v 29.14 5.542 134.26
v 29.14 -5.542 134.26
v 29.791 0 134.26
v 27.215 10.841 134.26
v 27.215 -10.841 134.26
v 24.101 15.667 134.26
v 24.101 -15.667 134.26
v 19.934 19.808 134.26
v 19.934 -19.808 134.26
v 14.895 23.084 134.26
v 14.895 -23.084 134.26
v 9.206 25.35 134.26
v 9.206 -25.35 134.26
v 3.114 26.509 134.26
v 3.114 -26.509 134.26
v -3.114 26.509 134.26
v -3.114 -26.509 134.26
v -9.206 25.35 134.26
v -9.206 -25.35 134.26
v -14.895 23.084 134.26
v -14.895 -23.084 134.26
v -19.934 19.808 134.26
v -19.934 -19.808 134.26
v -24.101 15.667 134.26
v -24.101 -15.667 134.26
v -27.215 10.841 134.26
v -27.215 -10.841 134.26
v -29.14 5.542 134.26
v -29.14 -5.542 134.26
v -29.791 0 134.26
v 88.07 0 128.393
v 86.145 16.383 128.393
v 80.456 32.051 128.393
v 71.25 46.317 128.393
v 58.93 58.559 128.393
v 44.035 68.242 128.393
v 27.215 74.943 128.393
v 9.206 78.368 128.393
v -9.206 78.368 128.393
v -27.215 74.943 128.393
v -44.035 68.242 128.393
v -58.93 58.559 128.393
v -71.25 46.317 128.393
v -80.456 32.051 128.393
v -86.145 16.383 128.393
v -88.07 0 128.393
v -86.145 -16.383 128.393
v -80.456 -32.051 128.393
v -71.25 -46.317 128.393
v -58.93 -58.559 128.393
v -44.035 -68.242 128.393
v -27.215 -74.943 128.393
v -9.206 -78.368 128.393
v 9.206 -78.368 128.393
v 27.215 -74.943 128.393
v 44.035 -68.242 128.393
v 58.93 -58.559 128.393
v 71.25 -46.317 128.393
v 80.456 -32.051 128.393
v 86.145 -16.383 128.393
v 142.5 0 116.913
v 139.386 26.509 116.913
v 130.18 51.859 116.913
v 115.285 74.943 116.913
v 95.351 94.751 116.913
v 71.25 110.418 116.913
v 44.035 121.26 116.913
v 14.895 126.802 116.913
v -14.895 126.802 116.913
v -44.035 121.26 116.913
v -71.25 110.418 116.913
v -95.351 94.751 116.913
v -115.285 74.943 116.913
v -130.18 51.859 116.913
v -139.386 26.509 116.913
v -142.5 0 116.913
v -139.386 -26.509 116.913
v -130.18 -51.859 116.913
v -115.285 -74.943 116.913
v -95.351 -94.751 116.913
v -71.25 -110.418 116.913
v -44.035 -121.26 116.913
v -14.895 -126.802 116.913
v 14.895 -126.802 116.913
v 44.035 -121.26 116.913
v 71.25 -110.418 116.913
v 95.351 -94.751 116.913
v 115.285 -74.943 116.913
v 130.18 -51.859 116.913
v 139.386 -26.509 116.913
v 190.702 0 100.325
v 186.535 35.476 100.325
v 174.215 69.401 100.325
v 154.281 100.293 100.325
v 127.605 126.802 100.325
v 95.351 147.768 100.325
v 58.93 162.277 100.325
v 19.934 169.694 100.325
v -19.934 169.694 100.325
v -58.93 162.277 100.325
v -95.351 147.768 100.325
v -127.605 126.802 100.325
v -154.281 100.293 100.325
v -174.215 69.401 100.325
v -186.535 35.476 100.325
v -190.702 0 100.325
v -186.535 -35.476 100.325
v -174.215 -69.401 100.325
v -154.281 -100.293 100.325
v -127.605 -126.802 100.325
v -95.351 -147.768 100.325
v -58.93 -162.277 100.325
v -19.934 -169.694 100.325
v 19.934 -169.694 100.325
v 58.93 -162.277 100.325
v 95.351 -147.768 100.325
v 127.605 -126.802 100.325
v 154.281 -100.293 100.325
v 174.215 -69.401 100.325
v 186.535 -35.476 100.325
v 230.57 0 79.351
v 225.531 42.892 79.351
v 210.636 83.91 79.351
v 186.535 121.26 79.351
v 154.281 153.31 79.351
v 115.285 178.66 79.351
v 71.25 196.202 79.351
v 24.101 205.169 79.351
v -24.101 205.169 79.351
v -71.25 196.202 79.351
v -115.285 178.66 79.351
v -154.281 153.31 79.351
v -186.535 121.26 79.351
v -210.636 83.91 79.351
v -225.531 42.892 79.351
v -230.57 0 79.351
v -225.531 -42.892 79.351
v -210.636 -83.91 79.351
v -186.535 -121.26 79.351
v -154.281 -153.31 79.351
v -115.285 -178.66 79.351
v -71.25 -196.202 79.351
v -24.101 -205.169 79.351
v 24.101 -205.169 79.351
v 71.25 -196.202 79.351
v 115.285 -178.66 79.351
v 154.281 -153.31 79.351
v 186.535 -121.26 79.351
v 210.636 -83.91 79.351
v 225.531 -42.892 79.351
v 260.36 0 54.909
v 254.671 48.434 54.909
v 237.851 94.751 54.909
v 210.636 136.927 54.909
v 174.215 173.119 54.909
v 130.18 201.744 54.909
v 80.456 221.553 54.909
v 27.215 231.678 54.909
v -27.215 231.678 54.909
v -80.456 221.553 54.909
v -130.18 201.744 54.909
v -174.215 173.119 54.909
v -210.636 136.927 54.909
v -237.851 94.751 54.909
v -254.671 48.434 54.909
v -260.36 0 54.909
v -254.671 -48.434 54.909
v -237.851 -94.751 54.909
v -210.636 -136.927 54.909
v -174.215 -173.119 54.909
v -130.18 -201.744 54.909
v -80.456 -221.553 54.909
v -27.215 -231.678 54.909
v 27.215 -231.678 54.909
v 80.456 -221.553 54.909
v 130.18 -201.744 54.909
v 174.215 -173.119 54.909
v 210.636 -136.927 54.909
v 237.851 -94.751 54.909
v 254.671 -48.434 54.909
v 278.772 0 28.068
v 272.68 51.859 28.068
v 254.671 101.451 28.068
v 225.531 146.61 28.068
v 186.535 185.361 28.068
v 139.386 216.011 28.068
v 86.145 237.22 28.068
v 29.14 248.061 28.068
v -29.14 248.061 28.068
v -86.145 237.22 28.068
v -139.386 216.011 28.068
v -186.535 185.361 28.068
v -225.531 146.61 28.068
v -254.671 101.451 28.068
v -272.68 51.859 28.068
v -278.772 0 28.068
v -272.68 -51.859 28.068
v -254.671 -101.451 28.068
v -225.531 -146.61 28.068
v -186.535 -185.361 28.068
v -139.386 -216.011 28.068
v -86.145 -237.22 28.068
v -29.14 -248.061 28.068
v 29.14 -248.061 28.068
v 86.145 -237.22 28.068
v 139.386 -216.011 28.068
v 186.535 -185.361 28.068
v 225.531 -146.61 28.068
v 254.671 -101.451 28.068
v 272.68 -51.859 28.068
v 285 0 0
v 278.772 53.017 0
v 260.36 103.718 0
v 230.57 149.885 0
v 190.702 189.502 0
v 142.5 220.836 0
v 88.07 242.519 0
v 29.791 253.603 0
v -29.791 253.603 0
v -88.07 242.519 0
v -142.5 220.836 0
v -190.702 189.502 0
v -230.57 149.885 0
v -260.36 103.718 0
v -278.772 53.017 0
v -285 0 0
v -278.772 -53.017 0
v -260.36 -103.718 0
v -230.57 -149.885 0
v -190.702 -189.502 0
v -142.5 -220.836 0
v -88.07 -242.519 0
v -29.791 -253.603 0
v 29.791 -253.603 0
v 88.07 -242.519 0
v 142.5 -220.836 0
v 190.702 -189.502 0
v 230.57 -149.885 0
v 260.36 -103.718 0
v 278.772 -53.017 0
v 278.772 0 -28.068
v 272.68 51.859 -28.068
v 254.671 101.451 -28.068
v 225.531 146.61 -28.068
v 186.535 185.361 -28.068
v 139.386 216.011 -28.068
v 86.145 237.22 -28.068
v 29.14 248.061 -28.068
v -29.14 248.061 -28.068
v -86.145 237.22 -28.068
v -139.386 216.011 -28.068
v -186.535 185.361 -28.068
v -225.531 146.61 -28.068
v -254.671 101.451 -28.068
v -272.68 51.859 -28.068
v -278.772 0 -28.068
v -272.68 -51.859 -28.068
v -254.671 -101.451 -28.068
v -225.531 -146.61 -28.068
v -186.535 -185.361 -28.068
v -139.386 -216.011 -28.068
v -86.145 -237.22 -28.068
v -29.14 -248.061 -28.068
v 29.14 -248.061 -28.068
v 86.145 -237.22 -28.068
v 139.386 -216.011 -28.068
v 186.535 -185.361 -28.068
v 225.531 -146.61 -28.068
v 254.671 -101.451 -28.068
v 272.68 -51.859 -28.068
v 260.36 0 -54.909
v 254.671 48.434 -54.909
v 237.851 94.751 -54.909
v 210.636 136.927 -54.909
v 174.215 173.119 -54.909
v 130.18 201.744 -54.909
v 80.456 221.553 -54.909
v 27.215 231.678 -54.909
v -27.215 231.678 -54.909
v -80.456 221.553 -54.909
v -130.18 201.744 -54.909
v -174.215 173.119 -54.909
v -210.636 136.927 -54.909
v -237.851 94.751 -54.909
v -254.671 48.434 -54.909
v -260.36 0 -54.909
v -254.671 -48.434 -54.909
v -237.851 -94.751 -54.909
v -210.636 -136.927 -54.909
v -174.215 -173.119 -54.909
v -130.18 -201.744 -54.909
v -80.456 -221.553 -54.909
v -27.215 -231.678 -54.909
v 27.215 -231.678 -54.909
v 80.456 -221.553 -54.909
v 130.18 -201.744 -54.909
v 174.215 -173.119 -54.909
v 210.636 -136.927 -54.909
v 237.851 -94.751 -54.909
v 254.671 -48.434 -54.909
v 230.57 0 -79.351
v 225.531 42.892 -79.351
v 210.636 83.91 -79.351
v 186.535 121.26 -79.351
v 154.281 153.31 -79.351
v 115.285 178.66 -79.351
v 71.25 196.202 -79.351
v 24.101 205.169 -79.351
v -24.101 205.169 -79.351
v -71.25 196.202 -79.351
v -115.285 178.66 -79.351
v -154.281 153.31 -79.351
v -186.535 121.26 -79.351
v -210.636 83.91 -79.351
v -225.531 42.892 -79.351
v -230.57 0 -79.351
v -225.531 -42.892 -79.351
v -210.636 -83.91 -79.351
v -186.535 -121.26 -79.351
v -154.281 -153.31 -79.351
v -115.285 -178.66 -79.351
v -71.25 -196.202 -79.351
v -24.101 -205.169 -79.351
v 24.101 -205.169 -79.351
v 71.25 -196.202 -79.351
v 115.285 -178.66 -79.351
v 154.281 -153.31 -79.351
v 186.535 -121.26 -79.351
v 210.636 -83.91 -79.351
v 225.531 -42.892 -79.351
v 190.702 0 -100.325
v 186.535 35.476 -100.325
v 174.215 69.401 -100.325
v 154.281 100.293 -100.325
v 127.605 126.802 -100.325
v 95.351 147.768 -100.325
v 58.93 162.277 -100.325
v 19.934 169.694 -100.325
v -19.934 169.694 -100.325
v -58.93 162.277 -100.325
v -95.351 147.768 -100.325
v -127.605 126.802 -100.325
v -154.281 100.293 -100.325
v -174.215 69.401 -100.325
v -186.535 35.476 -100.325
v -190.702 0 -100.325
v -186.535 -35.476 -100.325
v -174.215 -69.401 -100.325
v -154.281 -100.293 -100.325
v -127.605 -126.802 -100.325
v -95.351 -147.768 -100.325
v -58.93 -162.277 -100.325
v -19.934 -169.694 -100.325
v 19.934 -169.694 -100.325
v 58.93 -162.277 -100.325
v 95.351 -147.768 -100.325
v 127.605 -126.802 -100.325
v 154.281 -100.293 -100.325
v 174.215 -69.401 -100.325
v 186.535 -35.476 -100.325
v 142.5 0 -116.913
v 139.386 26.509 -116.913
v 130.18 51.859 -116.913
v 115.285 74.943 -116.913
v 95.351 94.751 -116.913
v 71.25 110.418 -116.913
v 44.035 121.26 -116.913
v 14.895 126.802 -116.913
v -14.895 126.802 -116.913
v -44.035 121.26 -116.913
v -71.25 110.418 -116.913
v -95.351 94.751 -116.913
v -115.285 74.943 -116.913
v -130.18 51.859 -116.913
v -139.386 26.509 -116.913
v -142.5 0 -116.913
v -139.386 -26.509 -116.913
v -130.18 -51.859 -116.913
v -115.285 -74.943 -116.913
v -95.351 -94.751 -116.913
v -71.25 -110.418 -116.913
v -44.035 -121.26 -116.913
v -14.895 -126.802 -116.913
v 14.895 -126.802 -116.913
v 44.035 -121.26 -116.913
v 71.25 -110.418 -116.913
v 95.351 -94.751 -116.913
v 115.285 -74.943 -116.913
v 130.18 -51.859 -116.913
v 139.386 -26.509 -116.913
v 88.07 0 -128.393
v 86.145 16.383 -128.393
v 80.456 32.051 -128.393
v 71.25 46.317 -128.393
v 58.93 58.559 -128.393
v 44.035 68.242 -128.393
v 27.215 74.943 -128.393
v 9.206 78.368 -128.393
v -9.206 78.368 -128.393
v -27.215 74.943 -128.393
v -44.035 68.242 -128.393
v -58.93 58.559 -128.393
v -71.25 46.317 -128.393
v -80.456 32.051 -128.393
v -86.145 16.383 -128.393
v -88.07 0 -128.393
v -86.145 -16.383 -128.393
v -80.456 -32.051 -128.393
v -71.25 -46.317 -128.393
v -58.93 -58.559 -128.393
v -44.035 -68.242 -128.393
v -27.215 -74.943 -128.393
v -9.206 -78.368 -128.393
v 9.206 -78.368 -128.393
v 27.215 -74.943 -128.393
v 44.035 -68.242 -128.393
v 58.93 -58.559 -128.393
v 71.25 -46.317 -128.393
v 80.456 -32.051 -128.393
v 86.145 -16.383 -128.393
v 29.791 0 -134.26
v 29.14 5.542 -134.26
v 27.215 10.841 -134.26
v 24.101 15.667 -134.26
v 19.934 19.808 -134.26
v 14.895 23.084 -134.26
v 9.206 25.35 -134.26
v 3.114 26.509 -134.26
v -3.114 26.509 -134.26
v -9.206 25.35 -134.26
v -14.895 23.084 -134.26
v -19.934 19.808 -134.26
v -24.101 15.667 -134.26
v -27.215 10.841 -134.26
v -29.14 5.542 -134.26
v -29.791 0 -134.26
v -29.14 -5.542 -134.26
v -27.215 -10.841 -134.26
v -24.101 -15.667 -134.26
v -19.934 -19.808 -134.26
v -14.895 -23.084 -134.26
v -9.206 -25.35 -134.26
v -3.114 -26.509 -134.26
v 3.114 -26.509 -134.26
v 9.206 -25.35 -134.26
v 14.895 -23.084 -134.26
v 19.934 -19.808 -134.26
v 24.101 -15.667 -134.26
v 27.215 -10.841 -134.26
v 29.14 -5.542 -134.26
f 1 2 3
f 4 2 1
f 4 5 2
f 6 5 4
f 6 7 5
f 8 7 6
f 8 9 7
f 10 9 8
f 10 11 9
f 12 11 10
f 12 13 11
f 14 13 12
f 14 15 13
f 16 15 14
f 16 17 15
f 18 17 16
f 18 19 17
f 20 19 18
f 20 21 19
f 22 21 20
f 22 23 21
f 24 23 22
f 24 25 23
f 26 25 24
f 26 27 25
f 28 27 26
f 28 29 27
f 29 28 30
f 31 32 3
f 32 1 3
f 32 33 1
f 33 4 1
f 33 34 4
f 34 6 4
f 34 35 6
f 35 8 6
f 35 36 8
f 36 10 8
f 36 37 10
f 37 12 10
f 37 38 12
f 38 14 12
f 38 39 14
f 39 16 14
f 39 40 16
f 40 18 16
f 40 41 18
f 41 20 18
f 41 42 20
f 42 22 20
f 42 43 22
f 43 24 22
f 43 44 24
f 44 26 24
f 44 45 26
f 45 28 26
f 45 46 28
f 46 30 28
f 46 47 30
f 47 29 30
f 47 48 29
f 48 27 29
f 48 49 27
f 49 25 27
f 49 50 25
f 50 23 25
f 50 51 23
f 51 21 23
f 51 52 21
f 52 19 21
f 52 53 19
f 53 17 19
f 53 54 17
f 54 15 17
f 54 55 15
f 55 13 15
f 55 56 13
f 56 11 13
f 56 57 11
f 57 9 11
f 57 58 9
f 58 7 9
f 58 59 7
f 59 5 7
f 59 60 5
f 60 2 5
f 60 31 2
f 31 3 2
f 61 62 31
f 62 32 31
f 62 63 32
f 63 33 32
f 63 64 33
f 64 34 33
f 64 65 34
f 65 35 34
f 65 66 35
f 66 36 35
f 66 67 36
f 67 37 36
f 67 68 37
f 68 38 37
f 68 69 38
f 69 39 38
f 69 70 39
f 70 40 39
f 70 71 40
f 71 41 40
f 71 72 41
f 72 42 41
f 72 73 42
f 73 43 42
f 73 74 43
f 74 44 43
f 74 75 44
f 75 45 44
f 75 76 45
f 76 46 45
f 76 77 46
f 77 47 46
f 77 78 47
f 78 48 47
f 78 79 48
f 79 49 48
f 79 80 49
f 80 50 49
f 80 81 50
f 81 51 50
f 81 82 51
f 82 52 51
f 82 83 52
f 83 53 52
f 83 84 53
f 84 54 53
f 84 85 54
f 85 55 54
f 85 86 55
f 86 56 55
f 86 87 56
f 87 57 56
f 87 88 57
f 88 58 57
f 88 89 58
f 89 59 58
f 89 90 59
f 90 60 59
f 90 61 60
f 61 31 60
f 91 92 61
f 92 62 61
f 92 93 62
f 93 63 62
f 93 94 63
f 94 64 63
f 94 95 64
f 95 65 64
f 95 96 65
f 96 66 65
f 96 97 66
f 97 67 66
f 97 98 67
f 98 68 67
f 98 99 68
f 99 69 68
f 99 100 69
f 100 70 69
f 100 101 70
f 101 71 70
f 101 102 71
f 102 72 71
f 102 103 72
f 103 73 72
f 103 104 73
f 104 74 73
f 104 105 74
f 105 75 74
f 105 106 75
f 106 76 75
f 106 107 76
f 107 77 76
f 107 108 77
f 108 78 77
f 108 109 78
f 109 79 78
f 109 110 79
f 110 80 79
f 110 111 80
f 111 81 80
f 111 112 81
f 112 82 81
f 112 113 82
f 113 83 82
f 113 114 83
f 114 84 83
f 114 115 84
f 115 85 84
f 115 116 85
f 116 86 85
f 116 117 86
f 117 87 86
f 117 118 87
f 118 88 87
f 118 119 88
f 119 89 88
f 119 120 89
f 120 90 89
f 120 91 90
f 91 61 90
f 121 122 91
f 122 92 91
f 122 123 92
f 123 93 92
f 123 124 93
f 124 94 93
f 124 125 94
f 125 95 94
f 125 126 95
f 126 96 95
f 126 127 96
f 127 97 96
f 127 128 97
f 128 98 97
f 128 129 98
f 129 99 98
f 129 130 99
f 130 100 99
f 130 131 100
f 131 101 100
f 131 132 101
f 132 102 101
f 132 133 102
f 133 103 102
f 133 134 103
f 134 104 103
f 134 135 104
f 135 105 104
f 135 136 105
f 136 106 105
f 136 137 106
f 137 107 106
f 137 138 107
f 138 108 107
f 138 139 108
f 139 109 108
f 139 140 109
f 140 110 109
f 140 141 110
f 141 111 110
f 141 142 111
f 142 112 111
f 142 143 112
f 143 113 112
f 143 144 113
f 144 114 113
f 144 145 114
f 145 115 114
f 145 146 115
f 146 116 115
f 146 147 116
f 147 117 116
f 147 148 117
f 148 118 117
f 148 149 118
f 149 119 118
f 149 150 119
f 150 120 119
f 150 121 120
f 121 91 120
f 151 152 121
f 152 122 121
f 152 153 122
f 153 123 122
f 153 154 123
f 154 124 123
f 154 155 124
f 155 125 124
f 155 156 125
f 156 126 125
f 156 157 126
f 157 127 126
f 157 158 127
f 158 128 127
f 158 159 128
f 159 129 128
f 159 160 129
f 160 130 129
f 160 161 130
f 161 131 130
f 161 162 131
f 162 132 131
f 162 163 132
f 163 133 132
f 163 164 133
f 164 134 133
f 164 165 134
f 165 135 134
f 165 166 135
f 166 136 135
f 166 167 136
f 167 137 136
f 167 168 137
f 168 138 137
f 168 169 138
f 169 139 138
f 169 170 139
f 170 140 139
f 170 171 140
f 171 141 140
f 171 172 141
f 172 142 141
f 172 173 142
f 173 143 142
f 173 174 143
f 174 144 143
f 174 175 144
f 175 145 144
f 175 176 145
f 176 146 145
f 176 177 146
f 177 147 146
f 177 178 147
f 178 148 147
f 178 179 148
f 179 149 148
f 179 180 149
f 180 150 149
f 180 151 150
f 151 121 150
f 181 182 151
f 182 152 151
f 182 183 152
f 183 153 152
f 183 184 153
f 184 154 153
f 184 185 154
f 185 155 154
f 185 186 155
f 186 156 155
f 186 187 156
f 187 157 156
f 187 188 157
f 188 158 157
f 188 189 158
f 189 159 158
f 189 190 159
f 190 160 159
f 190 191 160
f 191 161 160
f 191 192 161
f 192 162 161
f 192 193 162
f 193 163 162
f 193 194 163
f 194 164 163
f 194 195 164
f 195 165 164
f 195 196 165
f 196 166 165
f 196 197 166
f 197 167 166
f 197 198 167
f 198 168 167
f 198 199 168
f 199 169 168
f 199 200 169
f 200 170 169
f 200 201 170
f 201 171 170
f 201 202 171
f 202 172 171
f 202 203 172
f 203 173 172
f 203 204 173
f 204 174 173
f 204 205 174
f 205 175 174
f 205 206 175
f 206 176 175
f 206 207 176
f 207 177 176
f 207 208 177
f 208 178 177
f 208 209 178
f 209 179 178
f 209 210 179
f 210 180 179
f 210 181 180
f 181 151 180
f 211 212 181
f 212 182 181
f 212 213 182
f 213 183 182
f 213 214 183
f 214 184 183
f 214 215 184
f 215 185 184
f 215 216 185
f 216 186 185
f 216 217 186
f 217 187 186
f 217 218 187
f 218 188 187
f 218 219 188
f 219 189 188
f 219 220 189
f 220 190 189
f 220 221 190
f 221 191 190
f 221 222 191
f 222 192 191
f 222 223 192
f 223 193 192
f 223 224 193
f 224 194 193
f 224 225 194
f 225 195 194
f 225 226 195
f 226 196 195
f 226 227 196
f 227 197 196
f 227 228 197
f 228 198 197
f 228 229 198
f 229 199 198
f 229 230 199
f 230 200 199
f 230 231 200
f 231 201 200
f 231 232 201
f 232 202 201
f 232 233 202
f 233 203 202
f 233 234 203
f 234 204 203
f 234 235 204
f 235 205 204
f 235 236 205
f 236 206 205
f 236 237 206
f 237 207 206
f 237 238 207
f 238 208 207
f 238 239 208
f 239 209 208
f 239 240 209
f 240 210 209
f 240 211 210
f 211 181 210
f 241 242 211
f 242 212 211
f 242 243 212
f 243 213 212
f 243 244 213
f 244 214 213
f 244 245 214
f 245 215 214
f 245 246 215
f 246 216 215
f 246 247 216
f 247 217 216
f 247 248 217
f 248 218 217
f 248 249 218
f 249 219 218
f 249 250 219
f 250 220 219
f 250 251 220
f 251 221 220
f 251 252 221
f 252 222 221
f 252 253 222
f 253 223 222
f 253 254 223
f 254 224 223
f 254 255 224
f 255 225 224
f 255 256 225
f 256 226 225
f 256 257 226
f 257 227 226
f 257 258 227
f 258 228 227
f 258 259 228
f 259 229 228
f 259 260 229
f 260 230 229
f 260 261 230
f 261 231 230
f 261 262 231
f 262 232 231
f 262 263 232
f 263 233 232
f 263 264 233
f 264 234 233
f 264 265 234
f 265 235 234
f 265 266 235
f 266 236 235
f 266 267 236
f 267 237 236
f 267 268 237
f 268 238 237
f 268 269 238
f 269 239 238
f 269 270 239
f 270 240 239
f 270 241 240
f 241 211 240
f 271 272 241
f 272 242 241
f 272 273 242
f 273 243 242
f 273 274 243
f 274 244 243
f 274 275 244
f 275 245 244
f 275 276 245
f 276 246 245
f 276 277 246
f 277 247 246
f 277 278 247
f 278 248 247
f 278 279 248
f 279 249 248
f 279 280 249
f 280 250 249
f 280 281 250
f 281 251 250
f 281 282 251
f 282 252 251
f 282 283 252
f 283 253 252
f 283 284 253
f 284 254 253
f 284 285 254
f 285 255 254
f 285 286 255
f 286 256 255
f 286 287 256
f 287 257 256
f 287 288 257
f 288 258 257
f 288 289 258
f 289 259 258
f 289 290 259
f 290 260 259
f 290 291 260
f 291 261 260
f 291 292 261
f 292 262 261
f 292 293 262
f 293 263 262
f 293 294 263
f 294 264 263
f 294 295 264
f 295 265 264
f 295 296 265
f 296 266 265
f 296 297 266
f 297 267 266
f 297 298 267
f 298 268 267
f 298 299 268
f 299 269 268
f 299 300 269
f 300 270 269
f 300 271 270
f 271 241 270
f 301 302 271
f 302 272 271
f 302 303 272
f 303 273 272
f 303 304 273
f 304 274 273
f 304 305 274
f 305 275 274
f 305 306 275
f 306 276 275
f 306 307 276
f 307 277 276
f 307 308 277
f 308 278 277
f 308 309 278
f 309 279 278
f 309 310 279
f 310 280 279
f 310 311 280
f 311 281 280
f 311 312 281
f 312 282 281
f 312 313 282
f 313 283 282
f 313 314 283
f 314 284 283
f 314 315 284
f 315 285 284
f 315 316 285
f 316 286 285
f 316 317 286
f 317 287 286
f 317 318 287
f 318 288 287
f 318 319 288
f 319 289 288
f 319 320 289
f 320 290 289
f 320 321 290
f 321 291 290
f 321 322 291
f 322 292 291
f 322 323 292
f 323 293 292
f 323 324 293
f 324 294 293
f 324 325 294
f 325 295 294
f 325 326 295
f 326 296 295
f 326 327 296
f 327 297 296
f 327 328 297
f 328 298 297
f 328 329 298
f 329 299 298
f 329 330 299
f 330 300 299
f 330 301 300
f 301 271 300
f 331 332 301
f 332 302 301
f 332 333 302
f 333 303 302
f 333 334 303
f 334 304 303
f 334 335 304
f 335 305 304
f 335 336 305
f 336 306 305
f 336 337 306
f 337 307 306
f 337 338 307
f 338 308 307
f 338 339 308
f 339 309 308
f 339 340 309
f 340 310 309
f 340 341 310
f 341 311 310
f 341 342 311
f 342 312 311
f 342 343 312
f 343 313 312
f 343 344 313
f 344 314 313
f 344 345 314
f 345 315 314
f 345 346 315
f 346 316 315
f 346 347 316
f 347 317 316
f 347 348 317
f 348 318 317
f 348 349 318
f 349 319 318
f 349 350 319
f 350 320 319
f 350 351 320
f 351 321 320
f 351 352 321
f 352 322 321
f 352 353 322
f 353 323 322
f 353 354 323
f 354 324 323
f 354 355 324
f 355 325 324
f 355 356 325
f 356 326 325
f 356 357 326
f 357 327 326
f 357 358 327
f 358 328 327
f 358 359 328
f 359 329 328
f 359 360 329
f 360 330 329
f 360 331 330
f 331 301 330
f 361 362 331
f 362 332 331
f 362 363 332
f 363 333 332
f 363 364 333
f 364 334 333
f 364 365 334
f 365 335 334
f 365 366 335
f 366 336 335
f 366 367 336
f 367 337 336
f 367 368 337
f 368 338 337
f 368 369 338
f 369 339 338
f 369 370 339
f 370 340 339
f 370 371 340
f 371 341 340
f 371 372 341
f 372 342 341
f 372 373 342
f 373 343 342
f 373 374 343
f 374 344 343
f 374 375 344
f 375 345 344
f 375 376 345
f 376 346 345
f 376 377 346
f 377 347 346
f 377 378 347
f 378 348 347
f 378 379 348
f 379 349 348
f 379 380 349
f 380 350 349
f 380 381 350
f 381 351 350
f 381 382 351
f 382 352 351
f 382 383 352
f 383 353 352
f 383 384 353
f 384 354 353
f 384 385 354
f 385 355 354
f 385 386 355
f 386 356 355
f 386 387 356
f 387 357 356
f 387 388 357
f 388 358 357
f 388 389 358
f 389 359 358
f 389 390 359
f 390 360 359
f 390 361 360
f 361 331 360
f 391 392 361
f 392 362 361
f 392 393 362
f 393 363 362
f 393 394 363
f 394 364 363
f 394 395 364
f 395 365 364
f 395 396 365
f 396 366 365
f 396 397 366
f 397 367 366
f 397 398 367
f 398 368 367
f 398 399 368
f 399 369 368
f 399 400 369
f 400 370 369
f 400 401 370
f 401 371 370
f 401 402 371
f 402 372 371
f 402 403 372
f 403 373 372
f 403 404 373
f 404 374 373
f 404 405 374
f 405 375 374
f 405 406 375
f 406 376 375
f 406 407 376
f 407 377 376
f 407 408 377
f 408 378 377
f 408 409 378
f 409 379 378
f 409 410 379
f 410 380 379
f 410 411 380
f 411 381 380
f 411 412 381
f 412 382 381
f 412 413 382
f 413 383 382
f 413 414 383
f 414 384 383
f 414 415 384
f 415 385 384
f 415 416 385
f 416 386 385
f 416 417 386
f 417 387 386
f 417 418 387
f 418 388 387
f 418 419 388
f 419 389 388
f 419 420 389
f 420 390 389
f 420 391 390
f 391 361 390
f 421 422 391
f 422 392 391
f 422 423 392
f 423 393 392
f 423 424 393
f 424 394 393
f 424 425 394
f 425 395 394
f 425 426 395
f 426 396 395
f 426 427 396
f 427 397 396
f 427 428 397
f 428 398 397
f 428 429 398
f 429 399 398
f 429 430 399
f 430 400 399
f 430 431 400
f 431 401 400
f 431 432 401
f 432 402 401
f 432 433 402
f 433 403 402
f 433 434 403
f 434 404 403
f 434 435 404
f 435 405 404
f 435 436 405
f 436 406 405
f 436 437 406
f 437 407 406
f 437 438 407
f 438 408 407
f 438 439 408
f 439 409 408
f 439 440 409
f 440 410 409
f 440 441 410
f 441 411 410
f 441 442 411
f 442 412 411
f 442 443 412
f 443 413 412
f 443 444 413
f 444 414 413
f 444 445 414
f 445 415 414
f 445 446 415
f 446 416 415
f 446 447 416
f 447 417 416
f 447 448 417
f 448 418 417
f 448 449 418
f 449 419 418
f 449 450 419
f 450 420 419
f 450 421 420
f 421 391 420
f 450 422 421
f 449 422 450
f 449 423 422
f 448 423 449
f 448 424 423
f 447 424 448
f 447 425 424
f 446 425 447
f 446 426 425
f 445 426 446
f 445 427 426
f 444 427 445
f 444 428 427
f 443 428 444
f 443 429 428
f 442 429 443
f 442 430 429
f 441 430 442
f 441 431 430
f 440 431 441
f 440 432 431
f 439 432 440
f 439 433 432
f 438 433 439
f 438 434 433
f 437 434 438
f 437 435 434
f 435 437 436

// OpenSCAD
// Generated by SolidPython 1.0.1 on 2020-07-29 00:46:54


scale(v = [19, 17, 9]) {
	sphere(r = 15);
}
/***********************************************
*********      SolidPython code:      **********
************************************************
 
# import packages: SolidPython
from solid import *
from solid.utils import *
from itertools import chain, combinations, permutations


class Resize:

    def __init__(self, scad_file):
        self.scad_file = scad_file
        #self.scad_file = import_scad(scad_file)
        # cone/cylinder param:
        self.r1 = 0
        self.r2 = 0
        self.h = 0
        # rectangular prism param:
        self.w = 0
        self.l = 0
        # ellipse param:
        self.r = 0

    # import OpenScad code (file name corresponds to shape)


    # classify shape + parameters
    def assign(self, param1, param2, param3):
        if self.scad_file == 'cone.scad':
            self.r1 = param1
            self.r2 = param2
            self.h = param3
        elif self.scad_file == 'cylinder.scad':
            self.r1 = param1
            self.r2 = param2
            self.h = param3
        elif self.scad_file == 'rectangularPrism.scad':
            self.h = param1
            self.l = param2
            self.w = param3
        else:
            self.r = param1
            self.h = param2

    # resize parameters
    def iterate(self):
        x = range(3, 20, 2)
        i = 1
        if self.scad_file == 'cone.scad':
            tempList = list(permutations(x, 2))
            for temp in tempList:
                param1 = temp[0]
                param2 = temp[1]
                filepath = 'produced_scad_files/' + 'cone' + str(param1) + '_' + str(param2) + '_' + '.scad'
                scad_render_to_file(cylinder(h=param1, r1=param2, r2=0), filepath)

        elif self.scad_file == 'cylinder.scad':
            tempList = list(permutations(x, 3))
            for temp in tempList:
                param1 = temp[0]
                param2 = temp[1]
                filepath = 'produced_scad_files/' + 'cylinder' + str(param1) + '_' + str(param2) + '_' + '.scad'
                scad_render_to_file(cylinder(h=param1, r1=param2, r2=param2), filepath)

        elif self.scad_file == 'rectangularPrism.scad':
            tempList = list(permutations(x, 3))
            for temp in tempList:
                param1 = temp[0]
                param2 = temp[1]
                param3 = temp[2]
                filepath = 'produced_scad_files/' + 'rectangularPrism' + str(param1) + '_' + str(param2) + '_' + str(
                    param3) + '.scad'
                scad_render_to_file(cube(size=(param1, param2, param3)), filepath)

        elif self.scad_file == 'ellipse.scad':
            tempList = list(permutations(x, 4))
            for temp in tempList:
                param1 = temp[0]
                param2 = temp[1]
                param3 = temp[2]
                param4 = temp[3]
                filepath = 'produced_scad_files/' + 'ellipse' + str(param1) + '_' + str(param2) + '_' + str(param3) + '_' + str(param4) + '.scad'
                scad_render_to_file(scale([param1, param2, param3])(sphere(r=param4)), filepath)

    def render_to_scadfile(self):
        scad_render_to_file(scad, 'example.scad') 
 
************************************************/
